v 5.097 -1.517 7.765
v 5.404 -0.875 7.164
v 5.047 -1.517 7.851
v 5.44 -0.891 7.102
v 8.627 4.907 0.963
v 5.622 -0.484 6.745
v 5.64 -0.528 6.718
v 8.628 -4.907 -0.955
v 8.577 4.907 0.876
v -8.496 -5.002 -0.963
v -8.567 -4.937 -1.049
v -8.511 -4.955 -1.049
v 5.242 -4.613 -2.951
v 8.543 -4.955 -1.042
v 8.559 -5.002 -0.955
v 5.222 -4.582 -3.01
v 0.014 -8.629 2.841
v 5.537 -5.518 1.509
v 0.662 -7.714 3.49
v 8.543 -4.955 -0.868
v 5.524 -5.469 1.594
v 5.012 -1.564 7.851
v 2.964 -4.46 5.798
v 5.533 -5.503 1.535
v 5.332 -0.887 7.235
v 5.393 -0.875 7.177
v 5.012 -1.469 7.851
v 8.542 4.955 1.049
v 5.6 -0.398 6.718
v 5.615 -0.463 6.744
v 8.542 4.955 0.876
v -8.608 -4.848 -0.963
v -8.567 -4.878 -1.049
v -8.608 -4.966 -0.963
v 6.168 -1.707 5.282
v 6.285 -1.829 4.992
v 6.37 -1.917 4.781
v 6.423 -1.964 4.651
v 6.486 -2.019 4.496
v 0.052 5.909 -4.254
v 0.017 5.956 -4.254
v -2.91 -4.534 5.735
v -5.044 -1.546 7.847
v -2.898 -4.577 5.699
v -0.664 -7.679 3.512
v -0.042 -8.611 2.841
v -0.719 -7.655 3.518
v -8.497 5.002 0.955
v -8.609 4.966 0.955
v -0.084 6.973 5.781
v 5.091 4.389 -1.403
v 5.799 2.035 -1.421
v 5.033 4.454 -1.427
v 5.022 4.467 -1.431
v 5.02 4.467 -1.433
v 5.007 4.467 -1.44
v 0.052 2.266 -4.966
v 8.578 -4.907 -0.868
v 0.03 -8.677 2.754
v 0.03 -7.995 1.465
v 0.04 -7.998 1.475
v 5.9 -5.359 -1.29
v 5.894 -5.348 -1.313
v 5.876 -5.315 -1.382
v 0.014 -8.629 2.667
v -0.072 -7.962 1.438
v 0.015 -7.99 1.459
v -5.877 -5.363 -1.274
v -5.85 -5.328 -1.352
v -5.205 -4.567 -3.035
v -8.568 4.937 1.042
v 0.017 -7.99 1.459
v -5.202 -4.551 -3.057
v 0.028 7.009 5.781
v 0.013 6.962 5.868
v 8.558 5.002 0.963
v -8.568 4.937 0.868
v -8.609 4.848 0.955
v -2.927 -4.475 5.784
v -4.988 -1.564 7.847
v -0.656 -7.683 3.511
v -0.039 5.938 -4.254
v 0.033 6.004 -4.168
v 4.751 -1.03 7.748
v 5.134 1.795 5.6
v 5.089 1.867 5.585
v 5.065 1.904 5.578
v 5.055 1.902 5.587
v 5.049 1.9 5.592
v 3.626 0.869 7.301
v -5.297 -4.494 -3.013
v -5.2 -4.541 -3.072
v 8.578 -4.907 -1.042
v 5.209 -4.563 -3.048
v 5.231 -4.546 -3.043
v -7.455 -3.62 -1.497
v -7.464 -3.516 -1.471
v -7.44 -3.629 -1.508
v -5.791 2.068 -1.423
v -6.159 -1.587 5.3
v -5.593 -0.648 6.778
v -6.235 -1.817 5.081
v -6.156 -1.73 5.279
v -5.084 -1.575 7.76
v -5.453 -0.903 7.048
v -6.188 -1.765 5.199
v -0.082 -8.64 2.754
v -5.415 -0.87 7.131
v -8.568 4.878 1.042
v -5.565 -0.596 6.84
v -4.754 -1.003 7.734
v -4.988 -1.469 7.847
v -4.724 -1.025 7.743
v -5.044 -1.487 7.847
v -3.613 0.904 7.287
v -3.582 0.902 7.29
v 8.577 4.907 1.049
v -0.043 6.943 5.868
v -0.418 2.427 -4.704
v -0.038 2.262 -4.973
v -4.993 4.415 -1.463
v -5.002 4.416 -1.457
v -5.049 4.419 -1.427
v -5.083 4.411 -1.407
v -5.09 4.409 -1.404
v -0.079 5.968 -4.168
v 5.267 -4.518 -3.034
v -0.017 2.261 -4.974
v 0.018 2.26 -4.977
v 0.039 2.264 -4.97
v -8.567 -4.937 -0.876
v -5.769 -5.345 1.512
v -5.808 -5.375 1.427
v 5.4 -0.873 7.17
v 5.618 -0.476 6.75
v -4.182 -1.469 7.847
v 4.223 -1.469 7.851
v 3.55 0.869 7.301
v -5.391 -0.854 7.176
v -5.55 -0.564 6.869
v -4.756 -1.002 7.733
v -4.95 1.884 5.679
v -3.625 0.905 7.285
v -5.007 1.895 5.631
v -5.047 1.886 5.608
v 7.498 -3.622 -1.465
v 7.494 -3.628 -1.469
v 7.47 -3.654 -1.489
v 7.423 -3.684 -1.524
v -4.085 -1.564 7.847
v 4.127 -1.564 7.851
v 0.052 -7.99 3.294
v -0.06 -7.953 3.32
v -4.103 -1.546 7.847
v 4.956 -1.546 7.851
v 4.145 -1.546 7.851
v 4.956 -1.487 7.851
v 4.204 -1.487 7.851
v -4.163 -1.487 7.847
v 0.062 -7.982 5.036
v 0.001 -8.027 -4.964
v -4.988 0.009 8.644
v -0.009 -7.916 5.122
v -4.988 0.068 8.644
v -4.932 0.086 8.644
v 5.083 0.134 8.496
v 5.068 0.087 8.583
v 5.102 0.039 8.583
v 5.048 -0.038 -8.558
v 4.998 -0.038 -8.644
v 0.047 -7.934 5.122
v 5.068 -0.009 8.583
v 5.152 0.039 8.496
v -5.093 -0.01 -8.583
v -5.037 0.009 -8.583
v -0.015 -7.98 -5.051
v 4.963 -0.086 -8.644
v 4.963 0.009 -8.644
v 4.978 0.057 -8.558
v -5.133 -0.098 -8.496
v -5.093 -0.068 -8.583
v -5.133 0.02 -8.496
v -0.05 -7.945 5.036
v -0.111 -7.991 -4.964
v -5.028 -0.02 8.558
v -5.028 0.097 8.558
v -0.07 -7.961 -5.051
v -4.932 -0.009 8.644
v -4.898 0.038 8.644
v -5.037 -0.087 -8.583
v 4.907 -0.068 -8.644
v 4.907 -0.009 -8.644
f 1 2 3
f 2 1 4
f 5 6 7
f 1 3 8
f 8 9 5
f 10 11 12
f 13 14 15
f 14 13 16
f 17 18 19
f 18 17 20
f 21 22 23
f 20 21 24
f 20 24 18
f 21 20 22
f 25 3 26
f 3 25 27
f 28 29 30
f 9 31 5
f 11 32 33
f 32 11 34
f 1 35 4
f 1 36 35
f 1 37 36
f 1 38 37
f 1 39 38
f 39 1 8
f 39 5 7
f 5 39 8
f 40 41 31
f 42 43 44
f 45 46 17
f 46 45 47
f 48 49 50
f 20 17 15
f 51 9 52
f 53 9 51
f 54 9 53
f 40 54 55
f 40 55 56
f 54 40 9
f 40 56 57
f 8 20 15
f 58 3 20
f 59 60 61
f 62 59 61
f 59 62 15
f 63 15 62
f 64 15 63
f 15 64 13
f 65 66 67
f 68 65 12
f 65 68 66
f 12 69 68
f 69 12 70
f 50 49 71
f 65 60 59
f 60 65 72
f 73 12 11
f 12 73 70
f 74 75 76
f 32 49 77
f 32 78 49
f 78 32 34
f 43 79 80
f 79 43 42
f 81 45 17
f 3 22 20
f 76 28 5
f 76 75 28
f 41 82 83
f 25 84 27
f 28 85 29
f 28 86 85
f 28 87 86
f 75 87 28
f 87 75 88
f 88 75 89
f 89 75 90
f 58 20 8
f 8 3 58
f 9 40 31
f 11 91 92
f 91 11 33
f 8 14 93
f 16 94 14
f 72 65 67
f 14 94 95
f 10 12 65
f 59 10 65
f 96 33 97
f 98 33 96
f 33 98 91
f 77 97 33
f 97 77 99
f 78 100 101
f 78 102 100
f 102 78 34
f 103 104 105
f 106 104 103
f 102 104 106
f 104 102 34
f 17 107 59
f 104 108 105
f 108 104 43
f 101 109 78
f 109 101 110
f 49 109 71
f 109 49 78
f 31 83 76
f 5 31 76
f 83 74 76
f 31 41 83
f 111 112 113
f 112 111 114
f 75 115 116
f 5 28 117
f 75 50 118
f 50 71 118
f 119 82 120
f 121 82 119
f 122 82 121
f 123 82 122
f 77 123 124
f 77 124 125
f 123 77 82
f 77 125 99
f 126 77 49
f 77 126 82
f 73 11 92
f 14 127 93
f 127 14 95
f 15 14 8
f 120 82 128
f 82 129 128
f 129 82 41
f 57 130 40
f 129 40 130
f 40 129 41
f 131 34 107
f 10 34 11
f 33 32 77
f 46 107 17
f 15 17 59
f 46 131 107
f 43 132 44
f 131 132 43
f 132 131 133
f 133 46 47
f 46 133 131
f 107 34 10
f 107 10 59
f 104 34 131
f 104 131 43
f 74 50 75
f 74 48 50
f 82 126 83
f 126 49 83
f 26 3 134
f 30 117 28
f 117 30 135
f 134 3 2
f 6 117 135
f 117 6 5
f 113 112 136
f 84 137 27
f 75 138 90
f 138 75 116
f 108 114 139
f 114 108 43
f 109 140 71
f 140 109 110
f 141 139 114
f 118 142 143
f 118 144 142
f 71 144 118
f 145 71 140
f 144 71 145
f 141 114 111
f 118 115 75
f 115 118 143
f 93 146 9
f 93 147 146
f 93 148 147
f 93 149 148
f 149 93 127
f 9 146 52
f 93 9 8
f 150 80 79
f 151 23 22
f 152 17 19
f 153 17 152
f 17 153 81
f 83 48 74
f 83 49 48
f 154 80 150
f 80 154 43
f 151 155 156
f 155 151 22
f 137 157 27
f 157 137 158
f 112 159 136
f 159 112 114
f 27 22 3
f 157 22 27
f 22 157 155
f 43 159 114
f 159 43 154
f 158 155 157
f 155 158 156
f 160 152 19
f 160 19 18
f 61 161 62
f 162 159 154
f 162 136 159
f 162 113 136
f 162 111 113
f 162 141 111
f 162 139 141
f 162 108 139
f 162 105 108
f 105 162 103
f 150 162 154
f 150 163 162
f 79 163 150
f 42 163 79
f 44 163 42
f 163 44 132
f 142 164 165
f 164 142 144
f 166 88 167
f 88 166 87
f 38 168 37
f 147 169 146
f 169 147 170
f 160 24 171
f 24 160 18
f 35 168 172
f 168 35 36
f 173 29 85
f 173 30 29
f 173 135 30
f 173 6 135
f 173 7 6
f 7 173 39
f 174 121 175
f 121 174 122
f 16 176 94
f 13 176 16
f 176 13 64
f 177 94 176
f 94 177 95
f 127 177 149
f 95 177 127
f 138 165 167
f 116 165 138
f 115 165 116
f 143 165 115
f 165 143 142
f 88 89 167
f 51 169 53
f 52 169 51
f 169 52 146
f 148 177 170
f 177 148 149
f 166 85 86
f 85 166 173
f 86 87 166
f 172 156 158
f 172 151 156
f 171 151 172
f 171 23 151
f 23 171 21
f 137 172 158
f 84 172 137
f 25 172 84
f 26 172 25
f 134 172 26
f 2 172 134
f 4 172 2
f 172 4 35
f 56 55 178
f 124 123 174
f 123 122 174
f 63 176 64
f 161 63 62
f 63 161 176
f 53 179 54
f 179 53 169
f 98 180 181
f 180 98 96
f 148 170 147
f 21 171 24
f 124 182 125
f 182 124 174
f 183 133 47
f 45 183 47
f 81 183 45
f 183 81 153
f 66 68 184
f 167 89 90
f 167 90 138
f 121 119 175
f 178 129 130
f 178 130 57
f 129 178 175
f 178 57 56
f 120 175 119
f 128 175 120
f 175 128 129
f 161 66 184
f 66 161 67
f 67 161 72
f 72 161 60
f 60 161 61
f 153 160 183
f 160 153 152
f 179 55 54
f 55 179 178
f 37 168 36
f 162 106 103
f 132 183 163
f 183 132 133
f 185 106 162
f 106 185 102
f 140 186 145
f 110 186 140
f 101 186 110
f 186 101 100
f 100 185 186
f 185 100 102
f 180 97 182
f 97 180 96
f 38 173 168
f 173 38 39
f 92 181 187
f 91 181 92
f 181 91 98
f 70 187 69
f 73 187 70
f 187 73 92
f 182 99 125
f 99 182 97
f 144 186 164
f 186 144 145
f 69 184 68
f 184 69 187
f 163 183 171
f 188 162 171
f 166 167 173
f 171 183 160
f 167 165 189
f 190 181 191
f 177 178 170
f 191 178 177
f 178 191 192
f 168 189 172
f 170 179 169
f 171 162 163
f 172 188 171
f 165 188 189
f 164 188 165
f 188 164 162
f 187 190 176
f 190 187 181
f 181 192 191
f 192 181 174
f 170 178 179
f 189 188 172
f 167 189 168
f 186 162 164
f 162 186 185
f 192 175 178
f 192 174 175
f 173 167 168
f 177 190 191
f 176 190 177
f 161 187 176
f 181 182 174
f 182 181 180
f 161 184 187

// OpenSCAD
// Auto-generated OpenSCAD file

    inner_points = 10*[[-0.49475772011132046, 0.003839472954238088, 0.8557705860181677], [0.505223446776251, 0.0038995730095640058, 0.8496336276384451], [-0.505223446776251, -0.0038995730095640058, -0.8496336276384451], [0.49475772011132046, -0.003839472954238088, -0.8557705860181677], [0.003137871696801686, -0.788661439733275, 0.5035742160091927], [-0.002998750789873661, -0.7931992616167778, -0.49639665858516746], [-0.5000365230269928, 0.5223214995430275, 0.0006983537803530961], [0.4999446438605786, 0.5223815995983536, -0.00543860459936947], [-0.789374516264686, -0.4348859382371884, 0.006817726903340358], [0.7894510022985628, -0.43479104894911214, -0.0028716420739015092]];

    outer_points = 10*[[0.8526836986618631, 0.4907220093236373, 0.09625829137218865], [0.8527700142393673, -0.4907220093236373, -0.09549058296899036], [-0.8527700142393673, 0.4907220093236373, 0.09549058296899036], [-0.8526836986618631, -0.4907220093236373, -0.09625829137218865], [0.49965051582430237, -0.15166158156646264, 0.7764868514685156], [-0.5003493828586203, -0.15166158156646264, 0.7760367024438842], [0.00018761744828893297, 0.5908833725510971, -0.4167895941433019], [0.00027393302579300583, -0.3905606460961775, -0.6085384684844809], [-0.0002602518163823537, 0.6913983635916522, 0.578145848983155], [-0.0001239720133965481, -0.8581596810908002, 0.27540213141105363]];

    // Convex hull for inner set (I)
    module inner_hull() {
        hull() {
            for (p = inner_points) {
                translate(p) sphere(r=0.1);
            }
        }
    }

    // Convex hull for outer set (O) minus inner hull (O \ I)
    module outer_minus_inner() {
        difference() {
            hull() {
                for (p = outer_points) {
                    translate(p) sphere(r=0.1);
                }
            }
            inner_hull(); // Subtract inner hull
        }
    }

    // Convex hull for outer set (O) minus all translated inner hulls
    module outer_minus_AllTranslationInner() {
        difference() {
            hull() {
                for (p = outer_points) {
                    translate(p) sphere(r=0.1);
                }
            }
            hull() {
                translate([0,0,50]) inner_hull();
                translate([0,0,-50]) inner_hull();
            }; // Subtract translated inner hulls
        }
    }

    // Difference between outer_minus_inner and outer_minus_AllTranslationInner
    module outer_minus_inner_diff() {
        difference() {
            // Outer minus inner
            difference() {
                hull() {
                    for (p = outer_points) {
                        translate(p) sphere(r=0.1);
                    }
                }
                inner_hull();
            }

            // Subtract Outer minus AllTranslationInner
            difference() {
                hull() {
                    for (p = outer_points) {
                        translate(p) sphere(r=0.1);
                    }
                }
                hull() {
                    translate([0,0,50]) inner_hull();
                    translate([0,0,-50]) inner_hull();
                };
            }
        }
    }

    // Rendering all with colors applied
    color([1, 0, 0, 0.5]) inner_hull(); // Transparent red
    color([0, 1, 0, 1]) outer_minus_AllTranslationInner(); // Opaque green
    color([1, 1, 0, 1]) outer_minus_inner_diff(); // Opaque yellow
    
